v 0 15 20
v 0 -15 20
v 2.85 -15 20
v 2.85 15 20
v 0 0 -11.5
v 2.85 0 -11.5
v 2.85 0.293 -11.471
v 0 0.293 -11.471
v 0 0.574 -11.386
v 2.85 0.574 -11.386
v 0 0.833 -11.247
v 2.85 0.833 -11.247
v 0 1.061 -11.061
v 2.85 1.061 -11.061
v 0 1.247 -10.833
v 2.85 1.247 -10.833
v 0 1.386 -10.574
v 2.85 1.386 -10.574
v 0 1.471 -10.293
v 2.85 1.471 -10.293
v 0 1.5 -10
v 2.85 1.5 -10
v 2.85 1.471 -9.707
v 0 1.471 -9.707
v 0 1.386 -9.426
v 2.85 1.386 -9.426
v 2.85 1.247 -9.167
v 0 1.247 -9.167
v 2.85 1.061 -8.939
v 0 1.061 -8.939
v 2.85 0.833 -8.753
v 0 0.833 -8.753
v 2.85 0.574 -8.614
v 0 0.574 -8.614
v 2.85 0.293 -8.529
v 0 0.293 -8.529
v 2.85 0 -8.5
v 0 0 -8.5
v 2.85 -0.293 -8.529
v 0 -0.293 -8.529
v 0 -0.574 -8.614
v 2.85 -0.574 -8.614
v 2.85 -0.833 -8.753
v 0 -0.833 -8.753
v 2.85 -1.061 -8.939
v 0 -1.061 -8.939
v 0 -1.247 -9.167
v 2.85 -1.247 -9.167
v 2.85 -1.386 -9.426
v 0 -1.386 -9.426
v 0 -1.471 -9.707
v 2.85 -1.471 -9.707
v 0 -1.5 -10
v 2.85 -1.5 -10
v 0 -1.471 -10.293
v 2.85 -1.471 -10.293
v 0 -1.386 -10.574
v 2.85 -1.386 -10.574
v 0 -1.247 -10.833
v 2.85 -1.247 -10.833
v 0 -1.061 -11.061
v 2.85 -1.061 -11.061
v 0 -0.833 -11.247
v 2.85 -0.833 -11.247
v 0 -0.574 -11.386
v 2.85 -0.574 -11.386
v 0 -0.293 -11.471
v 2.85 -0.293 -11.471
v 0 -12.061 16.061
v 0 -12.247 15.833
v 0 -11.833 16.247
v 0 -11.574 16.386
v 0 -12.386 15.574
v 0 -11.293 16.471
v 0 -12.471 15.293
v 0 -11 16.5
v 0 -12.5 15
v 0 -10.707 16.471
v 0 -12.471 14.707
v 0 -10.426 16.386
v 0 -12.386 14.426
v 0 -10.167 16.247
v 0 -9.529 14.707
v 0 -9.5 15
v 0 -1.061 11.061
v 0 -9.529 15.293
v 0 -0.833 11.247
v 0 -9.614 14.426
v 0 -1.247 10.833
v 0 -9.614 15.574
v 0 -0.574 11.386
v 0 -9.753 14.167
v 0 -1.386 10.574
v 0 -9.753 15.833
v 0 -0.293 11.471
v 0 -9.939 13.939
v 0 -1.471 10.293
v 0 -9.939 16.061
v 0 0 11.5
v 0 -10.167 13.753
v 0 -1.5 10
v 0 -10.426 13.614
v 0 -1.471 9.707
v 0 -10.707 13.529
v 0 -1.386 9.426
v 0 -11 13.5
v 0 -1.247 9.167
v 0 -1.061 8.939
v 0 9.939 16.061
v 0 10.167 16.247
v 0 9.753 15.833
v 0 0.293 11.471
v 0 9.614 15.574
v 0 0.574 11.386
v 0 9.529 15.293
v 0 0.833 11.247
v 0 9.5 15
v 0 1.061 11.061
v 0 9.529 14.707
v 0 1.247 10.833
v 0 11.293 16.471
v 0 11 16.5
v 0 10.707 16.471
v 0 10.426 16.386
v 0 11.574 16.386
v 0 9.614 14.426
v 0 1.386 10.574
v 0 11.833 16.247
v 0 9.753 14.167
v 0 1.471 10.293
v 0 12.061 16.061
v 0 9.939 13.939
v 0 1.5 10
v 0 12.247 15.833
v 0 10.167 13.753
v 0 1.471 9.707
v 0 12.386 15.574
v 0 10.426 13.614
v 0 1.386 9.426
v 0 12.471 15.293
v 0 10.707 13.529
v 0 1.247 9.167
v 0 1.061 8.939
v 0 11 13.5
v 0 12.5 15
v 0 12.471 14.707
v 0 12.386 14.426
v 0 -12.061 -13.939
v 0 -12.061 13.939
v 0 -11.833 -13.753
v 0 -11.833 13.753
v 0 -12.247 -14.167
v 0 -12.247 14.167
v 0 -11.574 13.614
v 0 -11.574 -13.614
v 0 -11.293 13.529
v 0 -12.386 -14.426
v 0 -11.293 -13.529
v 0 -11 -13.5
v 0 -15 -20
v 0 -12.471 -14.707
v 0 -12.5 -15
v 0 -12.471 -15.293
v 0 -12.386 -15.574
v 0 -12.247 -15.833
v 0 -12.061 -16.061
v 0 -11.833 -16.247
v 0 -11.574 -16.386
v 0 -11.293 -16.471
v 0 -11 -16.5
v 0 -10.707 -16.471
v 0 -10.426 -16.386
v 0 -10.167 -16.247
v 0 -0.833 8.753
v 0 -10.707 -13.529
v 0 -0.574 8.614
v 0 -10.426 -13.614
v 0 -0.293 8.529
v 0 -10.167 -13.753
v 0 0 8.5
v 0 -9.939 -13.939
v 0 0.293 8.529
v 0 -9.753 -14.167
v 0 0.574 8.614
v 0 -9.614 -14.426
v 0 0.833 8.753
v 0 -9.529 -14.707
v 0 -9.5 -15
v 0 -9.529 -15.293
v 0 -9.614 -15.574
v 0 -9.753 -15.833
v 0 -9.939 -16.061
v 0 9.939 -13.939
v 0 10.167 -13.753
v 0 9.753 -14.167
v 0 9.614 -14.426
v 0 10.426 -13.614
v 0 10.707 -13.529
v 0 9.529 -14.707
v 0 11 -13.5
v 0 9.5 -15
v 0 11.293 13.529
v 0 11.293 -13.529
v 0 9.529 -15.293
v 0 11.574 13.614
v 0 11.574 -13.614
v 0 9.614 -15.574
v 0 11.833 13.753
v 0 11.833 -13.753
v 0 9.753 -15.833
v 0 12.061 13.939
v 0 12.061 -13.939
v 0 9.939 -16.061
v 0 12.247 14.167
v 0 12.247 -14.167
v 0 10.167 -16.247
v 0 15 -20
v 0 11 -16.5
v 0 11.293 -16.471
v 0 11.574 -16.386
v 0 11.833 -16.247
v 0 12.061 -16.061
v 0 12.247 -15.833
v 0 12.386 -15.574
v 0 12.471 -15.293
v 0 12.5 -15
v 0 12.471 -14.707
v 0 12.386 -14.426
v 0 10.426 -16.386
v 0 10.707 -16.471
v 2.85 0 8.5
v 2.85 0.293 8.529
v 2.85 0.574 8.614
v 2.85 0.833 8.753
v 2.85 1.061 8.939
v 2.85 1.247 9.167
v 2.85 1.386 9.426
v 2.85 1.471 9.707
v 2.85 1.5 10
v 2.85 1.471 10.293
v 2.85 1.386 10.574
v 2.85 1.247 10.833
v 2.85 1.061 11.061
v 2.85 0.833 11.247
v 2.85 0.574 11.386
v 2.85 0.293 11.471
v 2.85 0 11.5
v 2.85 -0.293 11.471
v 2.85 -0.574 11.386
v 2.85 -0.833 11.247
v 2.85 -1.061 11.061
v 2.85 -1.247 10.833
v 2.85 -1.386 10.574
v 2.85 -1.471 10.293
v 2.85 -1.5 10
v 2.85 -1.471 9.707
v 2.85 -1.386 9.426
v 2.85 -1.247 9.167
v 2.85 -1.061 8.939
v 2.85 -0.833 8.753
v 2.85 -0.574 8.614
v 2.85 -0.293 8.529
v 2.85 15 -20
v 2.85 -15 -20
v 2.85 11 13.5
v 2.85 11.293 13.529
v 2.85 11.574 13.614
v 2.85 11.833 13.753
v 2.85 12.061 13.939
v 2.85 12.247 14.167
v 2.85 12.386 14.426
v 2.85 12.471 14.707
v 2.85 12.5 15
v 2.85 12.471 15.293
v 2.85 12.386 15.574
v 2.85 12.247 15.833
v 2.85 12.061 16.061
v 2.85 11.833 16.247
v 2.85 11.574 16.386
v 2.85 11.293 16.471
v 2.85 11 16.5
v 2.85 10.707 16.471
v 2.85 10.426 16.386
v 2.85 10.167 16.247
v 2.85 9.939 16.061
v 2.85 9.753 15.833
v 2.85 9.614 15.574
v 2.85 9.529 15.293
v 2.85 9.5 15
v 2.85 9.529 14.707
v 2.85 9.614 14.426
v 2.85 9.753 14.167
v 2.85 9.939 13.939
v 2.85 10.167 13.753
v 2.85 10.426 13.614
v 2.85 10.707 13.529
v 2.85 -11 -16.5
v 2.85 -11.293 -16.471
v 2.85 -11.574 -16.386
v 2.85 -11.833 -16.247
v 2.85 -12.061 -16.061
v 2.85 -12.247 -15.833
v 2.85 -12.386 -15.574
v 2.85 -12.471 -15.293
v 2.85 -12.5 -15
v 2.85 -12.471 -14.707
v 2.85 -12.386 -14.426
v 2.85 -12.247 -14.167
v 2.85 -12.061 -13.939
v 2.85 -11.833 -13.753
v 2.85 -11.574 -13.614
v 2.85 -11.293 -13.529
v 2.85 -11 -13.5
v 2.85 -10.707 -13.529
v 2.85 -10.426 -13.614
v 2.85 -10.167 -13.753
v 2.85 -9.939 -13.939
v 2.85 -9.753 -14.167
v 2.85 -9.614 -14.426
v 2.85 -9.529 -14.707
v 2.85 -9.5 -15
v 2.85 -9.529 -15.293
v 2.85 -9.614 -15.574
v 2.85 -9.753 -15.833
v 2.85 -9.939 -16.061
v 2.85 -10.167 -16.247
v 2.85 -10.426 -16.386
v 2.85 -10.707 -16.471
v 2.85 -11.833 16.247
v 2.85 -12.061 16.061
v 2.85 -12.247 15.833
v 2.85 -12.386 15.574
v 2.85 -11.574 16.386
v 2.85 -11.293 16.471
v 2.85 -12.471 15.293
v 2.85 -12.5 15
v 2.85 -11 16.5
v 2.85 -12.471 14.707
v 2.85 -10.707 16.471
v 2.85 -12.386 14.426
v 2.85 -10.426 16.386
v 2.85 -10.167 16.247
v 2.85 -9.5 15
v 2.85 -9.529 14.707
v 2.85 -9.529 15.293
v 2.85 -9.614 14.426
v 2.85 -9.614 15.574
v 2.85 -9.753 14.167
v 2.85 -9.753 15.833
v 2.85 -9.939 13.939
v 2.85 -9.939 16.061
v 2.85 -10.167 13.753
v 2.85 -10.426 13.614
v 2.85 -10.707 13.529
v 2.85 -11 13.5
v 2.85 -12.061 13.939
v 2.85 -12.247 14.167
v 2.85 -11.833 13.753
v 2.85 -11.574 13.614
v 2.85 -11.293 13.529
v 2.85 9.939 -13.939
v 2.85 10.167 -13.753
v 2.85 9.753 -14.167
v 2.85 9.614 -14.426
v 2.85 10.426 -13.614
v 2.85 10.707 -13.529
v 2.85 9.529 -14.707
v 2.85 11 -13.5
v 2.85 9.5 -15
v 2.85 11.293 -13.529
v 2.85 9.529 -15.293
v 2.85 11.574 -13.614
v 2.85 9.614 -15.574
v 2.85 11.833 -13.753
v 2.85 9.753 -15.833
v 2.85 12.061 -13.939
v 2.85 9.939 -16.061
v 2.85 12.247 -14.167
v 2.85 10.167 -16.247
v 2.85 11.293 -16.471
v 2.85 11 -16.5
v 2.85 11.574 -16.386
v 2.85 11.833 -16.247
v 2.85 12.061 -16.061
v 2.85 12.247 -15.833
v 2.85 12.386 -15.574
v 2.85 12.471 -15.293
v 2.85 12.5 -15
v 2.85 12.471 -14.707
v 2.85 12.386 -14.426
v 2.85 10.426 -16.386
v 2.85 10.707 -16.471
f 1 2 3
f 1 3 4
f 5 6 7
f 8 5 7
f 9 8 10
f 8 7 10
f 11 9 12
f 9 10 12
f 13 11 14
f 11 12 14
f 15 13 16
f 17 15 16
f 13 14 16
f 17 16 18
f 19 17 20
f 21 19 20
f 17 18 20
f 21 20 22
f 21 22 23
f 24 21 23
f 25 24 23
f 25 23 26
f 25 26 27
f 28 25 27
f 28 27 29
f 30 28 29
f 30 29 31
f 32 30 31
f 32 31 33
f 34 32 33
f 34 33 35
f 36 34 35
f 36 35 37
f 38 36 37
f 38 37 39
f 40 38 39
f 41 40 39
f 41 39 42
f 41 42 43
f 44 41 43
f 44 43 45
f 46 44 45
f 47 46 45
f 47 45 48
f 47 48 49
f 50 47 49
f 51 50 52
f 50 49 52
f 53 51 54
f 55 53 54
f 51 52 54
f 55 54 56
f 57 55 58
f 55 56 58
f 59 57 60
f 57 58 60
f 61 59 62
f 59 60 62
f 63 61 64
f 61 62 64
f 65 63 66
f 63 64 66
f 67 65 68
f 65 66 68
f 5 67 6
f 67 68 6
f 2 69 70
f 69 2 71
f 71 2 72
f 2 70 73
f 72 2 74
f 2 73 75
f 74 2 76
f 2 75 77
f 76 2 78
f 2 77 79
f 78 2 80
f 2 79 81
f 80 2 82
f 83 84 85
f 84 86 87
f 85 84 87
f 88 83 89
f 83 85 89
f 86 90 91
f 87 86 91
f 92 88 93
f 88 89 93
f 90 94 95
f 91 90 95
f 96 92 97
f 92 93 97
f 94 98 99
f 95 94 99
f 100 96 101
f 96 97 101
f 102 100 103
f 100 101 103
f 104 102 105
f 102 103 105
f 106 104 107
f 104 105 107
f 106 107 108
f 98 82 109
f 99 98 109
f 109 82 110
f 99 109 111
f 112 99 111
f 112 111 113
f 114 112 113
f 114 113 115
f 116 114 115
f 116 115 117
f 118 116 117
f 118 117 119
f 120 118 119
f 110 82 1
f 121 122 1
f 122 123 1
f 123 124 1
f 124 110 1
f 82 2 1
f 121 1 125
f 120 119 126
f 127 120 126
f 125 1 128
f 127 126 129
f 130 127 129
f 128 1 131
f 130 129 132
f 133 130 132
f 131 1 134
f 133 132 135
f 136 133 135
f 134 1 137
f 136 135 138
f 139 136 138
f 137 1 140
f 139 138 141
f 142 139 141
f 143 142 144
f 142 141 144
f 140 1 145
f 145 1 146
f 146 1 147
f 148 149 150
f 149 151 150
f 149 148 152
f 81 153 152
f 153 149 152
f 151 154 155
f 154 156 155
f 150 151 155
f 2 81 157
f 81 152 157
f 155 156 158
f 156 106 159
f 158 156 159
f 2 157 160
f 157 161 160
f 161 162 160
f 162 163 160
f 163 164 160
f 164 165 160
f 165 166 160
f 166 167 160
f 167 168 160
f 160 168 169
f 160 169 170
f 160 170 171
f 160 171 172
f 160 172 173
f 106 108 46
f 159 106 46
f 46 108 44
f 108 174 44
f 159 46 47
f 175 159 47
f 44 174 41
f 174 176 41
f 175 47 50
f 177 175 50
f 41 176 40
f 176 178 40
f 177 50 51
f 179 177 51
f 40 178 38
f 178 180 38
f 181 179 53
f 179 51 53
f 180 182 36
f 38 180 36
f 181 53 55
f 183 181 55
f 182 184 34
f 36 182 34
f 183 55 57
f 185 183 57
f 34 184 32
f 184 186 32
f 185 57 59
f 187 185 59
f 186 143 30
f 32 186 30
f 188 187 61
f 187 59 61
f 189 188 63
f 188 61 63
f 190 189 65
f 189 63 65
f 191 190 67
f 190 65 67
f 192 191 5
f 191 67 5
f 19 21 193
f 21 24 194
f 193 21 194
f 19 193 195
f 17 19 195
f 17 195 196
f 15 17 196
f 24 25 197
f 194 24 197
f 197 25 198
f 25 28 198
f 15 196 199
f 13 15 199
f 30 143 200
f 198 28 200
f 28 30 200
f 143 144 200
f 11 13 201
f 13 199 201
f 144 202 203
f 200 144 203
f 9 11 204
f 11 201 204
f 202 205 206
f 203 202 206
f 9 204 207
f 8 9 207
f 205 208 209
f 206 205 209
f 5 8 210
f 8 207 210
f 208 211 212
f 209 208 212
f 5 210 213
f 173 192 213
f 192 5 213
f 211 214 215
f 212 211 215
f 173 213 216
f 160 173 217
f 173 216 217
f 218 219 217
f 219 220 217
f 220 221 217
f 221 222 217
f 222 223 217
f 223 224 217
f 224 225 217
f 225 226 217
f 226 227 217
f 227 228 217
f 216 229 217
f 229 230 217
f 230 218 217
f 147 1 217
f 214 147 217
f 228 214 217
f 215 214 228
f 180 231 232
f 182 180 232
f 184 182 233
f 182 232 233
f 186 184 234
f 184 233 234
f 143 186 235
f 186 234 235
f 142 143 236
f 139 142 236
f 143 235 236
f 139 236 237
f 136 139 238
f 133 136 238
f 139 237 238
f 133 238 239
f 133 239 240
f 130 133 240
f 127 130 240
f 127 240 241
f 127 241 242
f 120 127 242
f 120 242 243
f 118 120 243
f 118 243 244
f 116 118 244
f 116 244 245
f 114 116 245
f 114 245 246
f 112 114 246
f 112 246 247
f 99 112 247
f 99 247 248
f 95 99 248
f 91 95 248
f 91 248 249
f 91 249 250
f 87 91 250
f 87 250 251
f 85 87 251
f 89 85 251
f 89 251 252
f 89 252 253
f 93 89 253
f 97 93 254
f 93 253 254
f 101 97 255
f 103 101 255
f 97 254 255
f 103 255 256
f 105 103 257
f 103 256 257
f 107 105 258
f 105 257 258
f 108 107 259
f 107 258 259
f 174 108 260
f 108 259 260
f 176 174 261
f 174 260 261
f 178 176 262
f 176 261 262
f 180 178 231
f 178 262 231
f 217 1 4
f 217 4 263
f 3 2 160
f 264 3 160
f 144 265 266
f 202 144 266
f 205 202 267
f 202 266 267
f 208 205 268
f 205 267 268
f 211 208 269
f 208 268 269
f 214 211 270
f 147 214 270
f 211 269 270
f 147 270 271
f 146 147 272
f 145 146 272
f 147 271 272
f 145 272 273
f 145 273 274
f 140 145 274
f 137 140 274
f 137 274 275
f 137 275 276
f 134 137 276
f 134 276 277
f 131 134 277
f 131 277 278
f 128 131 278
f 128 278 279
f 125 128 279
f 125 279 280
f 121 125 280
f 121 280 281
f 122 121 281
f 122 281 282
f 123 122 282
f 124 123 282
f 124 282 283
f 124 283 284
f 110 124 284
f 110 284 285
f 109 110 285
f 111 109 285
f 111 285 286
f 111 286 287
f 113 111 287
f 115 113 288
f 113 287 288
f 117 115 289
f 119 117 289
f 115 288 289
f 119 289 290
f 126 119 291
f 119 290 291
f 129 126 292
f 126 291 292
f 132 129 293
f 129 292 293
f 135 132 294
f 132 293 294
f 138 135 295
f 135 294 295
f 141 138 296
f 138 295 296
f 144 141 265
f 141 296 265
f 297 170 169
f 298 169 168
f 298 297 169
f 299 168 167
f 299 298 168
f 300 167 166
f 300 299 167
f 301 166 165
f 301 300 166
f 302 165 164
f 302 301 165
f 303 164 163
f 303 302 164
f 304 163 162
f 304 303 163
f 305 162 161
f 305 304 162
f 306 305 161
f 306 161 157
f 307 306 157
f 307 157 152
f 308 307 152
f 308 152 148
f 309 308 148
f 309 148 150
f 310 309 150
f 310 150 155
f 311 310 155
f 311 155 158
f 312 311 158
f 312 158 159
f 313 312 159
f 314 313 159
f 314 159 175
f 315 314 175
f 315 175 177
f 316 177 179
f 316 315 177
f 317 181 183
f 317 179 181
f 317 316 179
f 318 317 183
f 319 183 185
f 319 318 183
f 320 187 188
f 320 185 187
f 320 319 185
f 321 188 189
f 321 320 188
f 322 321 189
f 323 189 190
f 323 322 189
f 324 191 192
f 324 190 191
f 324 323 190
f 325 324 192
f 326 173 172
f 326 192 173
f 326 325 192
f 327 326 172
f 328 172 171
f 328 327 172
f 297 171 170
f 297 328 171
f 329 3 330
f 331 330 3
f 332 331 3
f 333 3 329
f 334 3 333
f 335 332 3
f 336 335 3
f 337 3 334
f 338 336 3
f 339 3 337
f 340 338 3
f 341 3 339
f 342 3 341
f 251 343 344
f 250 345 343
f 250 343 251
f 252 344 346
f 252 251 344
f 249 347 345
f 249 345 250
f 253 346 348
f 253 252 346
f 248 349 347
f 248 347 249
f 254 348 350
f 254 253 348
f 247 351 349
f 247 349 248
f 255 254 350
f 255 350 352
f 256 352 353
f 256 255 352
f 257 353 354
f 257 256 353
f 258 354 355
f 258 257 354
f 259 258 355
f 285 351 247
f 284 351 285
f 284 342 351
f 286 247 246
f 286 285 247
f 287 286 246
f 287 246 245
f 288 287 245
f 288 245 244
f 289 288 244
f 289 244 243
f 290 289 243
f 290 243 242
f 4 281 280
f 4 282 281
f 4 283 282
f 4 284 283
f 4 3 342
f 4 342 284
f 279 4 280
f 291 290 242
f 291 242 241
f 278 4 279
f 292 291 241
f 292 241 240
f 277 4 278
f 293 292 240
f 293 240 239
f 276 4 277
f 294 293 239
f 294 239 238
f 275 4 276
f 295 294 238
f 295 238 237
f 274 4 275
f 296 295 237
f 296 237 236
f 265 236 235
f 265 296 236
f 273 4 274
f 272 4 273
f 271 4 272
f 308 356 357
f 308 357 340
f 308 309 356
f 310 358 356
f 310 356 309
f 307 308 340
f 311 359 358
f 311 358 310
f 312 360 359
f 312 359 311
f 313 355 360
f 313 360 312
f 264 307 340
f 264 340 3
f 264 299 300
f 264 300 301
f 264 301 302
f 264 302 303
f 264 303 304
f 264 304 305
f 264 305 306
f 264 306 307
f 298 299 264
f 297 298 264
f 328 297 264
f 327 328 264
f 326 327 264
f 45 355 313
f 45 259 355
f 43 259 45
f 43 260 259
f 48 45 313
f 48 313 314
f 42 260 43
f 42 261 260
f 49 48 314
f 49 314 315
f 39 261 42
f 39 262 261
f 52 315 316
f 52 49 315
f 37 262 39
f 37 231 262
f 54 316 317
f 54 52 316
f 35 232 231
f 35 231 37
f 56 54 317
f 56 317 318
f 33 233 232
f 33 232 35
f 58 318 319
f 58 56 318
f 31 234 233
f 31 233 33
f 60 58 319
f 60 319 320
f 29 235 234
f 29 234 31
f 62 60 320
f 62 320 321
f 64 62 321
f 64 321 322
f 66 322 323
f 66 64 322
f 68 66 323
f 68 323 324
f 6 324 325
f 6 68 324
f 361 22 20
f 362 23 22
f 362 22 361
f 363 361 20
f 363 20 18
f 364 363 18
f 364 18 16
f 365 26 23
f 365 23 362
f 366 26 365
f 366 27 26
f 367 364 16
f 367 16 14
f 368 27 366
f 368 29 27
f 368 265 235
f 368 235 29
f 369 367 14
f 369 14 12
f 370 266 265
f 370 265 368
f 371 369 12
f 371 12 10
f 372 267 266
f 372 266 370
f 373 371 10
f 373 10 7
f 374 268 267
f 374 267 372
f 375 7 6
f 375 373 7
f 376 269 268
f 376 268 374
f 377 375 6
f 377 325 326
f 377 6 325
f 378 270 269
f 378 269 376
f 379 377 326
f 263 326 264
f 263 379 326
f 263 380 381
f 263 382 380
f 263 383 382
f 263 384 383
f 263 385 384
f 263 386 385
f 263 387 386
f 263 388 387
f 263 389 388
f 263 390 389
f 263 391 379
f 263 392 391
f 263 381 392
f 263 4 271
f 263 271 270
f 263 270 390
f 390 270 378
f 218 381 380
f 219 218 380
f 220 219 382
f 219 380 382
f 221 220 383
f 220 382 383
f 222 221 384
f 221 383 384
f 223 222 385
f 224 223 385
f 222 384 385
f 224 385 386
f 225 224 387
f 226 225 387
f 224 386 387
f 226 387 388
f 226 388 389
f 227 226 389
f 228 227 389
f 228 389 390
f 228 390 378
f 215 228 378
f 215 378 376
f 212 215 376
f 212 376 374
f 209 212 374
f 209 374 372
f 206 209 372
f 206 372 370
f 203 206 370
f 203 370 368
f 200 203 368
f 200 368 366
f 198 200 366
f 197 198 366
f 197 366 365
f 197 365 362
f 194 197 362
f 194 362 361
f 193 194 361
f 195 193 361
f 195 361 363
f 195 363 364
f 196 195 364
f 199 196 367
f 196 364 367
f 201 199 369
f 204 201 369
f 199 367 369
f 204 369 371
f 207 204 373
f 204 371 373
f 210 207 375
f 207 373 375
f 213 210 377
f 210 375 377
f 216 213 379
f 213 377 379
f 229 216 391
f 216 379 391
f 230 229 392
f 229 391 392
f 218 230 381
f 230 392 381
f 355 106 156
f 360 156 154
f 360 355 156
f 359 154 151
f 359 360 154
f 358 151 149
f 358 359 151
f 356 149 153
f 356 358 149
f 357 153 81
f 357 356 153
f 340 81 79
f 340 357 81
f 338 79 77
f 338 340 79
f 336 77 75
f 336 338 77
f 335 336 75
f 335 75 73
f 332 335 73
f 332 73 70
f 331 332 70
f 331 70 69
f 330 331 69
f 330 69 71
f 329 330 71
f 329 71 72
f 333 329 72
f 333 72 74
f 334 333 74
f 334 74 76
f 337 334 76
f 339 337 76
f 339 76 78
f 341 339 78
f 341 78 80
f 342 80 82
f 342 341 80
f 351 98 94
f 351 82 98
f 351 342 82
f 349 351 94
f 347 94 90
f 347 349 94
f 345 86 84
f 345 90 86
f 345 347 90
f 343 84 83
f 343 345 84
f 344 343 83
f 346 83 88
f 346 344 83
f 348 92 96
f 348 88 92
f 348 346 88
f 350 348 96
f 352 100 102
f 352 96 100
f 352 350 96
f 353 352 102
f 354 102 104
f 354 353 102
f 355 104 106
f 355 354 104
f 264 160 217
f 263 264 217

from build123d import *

# Parameters (mm, degrees)
SKETCH1_W           = 40
SKETCH1_H           = 30
BOSS_EXTRUDE1_DEPTH = 2.85
SKETCH2_R           = 1.5
CUT_EXTRUDE1_DEPTH  = 26.161925602
SKETCH3_R           = 1.5
CUT_EXTRUDE2_DEPTH  = 26.161925602


with BuildPart() as part:
    # Sketch1 → Boss-Extrude1 (new body)
    with BuildSketch(Plane(origin=(0, 0, 0), x_dir=(0, 0, -1), z_dir=(1, 0, 0))):
        Rectangle(SKETCH1_W, SKETCH1_H)
    extrude(amount=BOSS_EXTRUDE1_DEPTH)

    # Sketch2 → Cut-Extrude1 (cut, through all)
    with BuildSketch(Plane(origin=(2.85, 0, 0), x_dir=(0, 0, -1), z_dir=(1, 0, 0))):
        with Locations((-10, 0)):
            Circle(SKETCH2_R)
        with Locations((10, 0)):
            Circle(SKETCH2_R)
    extrude(amount=-CUT_EXTRUDE1_DEPTH, mode=Mode.SUBTRACT)

    # Sketch3 → Cut-Extrude2 (cut, through all)
    with BuildSketch(Plane(origin=(2.85, 0, 0), x_dir=(0, 0, -1), z_dir=(1, 0, 0))):
        with Locations((-15, 11)):
            Circle(SKETCH3_R)
        with Locations((15, 11)):
            Circle(SKETCH3_R)
    cut_extrude2 = extrude(amount=-CUT_EXTRUDE2_DEPTH, mode=Mode.SUBTRACT)

    # Mirror1: Cut-Extrude2 across plane
    add(cut_extrude2.mirror(Plane.ZX), mode=Mode.SUBTRACT)


solid = part.part
